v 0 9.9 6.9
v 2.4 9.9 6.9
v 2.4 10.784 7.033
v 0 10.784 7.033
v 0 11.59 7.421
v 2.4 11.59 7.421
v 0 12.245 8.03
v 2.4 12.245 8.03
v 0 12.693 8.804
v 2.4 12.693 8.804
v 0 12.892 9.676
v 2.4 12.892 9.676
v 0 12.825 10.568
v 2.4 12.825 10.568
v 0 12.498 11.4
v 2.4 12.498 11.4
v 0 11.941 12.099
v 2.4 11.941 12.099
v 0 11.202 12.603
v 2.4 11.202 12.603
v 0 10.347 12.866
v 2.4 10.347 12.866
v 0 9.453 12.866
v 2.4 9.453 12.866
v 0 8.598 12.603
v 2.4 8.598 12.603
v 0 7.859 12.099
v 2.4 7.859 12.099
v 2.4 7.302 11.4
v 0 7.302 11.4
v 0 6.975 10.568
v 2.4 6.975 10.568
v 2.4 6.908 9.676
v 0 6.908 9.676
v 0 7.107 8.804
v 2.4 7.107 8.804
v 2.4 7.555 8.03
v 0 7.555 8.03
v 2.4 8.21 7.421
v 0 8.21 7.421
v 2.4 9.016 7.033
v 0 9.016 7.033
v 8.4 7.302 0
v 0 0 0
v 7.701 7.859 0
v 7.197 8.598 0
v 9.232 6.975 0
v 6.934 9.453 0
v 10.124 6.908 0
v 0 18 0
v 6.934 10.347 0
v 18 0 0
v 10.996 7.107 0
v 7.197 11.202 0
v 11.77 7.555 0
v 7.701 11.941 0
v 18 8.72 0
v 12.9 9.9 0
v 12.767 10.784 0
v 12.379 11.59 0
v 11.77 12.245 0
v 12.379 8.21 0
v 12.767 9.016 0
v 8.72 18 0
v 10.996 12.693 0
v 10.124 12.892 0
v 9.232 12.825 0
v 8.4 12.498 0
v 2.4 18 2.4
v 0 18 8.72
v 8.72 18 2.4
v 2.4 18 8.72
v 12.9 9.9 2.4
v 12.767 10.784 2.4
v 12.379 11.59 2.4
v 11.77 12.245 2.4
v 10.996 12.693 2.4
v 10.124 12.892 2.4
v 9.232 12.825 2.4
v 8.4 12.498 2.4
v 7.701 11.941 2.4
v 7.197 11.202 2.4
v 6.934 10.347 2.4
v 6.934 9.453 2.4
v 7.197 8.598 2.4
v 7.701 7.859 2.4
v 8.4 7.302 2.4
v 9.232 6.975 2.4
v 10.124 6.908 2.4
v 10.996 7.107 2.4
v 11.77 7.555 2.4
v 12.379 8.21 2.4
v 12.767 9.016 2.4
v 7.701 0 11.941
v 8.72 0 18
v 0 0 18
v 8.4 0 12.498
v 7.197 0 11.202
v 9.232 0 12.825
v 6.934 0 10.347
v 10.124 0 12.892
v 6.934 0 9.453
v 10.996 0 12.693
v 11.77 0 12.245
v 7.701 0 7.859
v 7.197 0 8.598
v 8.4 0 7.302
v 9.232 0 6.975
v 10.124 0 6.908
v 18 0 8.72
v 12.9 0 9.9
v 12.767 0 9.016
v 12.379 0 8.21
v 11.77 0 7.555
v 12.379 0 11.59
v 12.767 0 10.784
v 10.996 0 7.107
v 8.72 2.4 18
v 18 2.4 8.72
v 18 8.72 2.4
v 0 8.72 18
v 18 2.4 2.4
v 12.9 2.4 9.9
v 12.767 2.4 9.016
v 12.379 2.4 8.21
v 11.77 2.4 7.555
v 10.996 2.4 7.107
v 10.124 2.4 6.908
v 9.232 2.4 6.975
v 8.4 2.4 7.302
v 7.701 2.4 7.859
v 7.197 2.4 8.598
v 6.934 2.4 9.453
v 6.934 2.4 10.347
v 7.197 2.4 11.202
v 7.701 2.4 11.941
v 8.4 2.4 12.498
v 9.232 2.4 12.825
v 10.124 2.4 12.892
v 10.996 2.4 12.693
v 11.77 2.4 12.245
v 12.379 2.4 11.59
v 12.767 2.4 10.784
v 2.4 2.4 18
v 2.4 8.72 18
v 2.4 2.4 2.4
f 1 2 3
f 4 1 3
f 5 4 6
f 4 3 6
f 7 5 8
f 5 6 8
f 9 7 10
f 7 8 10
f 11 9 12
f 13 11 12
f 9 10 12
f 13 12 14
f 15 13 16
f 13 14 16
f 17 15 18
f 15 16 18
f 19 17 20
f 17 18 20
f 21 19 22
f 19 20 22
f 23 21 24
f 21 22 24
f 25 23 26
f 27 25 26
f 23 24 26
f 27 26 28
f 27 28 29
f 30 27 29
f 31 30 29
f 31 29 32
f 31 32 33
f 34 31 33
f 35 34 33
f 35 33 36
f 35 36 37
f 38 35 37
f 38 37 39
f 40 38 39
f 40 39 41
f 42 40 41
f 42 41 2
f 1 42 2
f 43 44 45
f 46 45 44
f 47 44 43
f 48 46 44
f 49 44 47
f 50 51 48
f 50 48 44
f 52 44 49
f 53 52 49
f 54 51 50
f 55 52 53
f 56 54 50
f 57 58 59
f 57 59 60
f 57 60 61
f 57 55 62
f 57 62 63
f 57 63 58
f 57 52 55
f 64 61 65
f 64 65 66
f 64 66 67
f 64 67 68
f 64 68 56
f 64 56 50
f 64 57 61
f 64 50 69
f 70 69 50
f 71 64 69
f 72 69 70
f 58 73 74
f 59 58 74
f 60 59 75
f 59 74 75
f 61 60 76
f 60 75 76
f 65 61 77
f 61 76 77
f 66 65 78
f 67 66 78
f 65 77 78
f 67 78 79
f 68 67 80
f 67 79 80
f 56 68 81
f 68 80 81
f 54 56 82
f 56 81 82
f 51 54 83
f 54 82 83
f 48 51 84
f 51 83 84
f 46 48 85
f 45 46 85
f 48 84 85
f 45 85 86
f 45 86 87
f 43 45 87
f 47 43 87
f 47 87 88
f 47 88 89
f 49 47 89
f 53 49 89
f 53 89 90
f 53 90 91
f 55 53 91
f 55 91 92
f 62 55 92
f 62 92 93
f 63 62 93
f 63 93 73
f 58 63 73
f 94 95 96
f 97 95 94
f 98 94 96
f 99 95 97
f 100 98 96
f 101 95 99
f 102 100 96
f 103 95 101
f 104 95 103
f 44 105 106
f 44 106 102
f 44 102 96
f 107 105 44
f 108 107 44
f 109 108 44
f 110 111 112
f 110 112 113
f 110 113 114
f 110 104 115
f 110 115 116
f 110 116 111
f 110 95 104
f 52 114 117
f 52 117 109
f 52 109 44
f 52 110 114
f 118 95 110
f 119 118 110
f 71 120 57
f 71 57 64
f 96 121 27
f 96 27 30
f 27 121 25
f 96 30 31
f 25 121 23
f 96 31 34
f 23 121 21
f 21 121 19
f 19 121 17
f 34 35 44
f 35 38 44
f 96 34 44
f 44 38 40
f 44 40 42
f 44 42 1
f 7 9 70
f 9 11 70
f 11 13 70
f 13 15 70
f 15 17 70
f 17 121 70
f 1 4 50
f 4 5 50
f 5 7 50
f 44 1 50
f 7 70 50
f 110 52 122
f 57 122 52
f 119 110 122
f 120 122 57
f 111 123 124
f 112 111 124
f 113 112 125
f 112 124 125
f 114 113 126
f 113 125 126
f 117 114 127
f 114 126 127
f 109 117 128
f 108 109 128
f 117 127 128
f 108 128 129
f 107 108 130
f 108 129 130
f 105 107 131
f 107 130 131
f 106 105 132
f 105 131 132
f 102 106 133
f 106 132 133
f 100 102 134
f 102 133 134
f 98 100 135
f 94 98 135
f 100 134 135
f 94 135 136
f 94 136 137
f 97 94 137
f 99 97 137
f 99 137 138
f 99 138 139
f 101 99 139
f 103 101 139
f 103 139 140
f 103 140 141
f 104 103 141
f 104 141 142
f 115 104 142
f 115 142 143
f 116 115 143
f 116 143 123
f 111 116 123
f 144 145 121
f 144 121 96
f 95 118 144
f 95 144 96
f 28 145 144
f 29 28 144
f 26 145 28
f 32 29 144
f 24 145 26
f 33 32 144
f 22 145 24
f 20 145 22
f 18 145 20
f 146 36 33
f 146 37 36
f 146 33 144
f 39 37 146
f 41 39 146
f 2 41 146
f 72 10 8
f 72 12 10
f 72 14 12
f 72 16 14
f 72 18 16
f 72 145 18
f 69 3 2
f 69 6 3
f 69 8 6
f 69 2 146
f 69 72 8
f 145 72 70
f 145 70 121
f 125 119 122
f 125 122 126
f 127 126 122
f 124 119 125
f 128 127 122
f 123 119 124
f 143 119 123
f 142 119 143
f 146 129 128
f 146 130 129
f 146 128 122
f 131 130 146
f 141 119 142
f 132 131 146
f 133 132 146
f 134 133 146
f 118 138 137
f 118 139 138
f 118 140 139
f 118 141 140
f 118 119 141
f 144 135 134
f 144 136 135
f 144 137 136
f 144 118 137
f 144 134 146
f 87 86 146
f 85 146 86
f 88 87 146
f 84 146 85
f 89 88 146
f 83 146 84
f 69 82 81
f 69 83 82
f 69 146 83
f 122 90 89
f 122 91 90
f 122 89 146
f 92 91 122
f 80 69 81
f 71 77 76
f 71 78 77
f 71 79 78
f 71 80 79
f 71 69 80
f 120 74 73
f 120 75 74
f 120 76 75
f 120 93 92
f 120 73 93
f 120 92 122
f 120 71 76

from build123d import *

# Parameters (mm, degrees)
BOSS_EXTRUDE1_DEPTH          = 2.4
SKETCH2_W                    = 15.6
SKETCH2_H                    = 2.4
BOSS_EXTRUDE2_DEPTH          = 6.32
BOSS_EXTRUDE3_DEPTH          = 2.4
BOSS_EXTRUDE4_DEPTH          = 2.4
F_6_0_6_DIAMETER_HOLE1_D     = 6
F_6_0_6_DIAMETER_HOLE1_DEPTH = 18.00005
F_6_0_6_DIAMETER_HOLE2_D     = 6
F_6_0_6_DIAMETER_HOLE2_DEPTH = 18.00005
F_6_0_6_DIAMETER_HOLE3_D     = 6
F_6_0_6_DIAMETER_HOLE3_DEPTH = 18.00005


with BuildPart() as part:
    # Boss-Extrude1: read off the stored shape, not the designer's step
    # Boss-Extrude1 outline → Boss-Extrude1 (new body)
    with BuildSketch(Plane(origin=(0, 0, 0), x_dir=(1, 0, 0), z_dir=(0, 1, 0))):
        Polygon((2.4, -18), (8.72, -18), (18, -8.72), (2.4, -8.72), align=None)
    extrude(amount=BOSS_EXTRUDE1_DEPTH)

    # Sketch2 → Boss-Extrude2 (add)
    with BuildSketch(Plane(origin=(0, 0, 8.72), x_dir=(-1, 0, 0), z_dir=(0, 0, -1))):
        with Locations((-10.2, 1.2)):
            Rectangle(SKETCH2_W, SKETCH2_H)
    extrude(amount=BOSS_EXTRUDE2_DEPTH)

    # Sketch3 → Boss-Extrude3 (add)
    with BuildSketch(Plane(origin=(0, 0, 2.4), x_dir=(-1, 0, 0), z_dir=(0, 0, -1))):
        Polygon((-2.4, 0), (-18, 0), (-18, 8.72), (-8.72, 18), (-2.4, 18), align=None)
    extrude(amount=BOSS_EXTRUDE3_DEPTH)

    # Sketch4 → Boss-Extrude4 (add)
    with BuildSketch(Plane.ZY.offset(-2.4)):
        Polygon((0, 18), (8.72, 18), (18, 8.72), (18, 0), (0, 0), align=None)
    extrude(amount=BOSS_EXTRUDE4_DEPTH)

    # Ø6.0 (6) Diameter Hole1
    with Locations(Plane.ZY):
        with Locations((9.9, 9.9)):
            Hole(F_6_0_6_DIAMETER_HOLE1_D / 2, depth=F_6_0_6_DIAMETER_HOLE1_DEPTH)

    # Ø6.0 (6) Diameter Hole2
    with Locations(Plane(origin=(0, 0, 0), x_dir=(-1, 0, 0), z_dir=(0, 0, -1))):
        with Locations((-9.9, 9.9)):
            Hole(F_6_0_6_DIAMETER_HOLE2_D / 2, depth=F_6_0_6_DIAMETER_HOLE2_DEPTH)

    # Ø6.0 (6) Diameter Hole3
    with Locations(Plane(origin=(0, 0, 0), x_dir=(-1, 0, 0), z_dir=(0, -1, 0))):
        with Locations((-9.9, -9.9)):
            Hole(F_6_0_6_DIAMETER_HOLE3_D / 2, depth=F_6_0_6_DIAMETER_HOLE3_DEPTH)


solid = part.part
